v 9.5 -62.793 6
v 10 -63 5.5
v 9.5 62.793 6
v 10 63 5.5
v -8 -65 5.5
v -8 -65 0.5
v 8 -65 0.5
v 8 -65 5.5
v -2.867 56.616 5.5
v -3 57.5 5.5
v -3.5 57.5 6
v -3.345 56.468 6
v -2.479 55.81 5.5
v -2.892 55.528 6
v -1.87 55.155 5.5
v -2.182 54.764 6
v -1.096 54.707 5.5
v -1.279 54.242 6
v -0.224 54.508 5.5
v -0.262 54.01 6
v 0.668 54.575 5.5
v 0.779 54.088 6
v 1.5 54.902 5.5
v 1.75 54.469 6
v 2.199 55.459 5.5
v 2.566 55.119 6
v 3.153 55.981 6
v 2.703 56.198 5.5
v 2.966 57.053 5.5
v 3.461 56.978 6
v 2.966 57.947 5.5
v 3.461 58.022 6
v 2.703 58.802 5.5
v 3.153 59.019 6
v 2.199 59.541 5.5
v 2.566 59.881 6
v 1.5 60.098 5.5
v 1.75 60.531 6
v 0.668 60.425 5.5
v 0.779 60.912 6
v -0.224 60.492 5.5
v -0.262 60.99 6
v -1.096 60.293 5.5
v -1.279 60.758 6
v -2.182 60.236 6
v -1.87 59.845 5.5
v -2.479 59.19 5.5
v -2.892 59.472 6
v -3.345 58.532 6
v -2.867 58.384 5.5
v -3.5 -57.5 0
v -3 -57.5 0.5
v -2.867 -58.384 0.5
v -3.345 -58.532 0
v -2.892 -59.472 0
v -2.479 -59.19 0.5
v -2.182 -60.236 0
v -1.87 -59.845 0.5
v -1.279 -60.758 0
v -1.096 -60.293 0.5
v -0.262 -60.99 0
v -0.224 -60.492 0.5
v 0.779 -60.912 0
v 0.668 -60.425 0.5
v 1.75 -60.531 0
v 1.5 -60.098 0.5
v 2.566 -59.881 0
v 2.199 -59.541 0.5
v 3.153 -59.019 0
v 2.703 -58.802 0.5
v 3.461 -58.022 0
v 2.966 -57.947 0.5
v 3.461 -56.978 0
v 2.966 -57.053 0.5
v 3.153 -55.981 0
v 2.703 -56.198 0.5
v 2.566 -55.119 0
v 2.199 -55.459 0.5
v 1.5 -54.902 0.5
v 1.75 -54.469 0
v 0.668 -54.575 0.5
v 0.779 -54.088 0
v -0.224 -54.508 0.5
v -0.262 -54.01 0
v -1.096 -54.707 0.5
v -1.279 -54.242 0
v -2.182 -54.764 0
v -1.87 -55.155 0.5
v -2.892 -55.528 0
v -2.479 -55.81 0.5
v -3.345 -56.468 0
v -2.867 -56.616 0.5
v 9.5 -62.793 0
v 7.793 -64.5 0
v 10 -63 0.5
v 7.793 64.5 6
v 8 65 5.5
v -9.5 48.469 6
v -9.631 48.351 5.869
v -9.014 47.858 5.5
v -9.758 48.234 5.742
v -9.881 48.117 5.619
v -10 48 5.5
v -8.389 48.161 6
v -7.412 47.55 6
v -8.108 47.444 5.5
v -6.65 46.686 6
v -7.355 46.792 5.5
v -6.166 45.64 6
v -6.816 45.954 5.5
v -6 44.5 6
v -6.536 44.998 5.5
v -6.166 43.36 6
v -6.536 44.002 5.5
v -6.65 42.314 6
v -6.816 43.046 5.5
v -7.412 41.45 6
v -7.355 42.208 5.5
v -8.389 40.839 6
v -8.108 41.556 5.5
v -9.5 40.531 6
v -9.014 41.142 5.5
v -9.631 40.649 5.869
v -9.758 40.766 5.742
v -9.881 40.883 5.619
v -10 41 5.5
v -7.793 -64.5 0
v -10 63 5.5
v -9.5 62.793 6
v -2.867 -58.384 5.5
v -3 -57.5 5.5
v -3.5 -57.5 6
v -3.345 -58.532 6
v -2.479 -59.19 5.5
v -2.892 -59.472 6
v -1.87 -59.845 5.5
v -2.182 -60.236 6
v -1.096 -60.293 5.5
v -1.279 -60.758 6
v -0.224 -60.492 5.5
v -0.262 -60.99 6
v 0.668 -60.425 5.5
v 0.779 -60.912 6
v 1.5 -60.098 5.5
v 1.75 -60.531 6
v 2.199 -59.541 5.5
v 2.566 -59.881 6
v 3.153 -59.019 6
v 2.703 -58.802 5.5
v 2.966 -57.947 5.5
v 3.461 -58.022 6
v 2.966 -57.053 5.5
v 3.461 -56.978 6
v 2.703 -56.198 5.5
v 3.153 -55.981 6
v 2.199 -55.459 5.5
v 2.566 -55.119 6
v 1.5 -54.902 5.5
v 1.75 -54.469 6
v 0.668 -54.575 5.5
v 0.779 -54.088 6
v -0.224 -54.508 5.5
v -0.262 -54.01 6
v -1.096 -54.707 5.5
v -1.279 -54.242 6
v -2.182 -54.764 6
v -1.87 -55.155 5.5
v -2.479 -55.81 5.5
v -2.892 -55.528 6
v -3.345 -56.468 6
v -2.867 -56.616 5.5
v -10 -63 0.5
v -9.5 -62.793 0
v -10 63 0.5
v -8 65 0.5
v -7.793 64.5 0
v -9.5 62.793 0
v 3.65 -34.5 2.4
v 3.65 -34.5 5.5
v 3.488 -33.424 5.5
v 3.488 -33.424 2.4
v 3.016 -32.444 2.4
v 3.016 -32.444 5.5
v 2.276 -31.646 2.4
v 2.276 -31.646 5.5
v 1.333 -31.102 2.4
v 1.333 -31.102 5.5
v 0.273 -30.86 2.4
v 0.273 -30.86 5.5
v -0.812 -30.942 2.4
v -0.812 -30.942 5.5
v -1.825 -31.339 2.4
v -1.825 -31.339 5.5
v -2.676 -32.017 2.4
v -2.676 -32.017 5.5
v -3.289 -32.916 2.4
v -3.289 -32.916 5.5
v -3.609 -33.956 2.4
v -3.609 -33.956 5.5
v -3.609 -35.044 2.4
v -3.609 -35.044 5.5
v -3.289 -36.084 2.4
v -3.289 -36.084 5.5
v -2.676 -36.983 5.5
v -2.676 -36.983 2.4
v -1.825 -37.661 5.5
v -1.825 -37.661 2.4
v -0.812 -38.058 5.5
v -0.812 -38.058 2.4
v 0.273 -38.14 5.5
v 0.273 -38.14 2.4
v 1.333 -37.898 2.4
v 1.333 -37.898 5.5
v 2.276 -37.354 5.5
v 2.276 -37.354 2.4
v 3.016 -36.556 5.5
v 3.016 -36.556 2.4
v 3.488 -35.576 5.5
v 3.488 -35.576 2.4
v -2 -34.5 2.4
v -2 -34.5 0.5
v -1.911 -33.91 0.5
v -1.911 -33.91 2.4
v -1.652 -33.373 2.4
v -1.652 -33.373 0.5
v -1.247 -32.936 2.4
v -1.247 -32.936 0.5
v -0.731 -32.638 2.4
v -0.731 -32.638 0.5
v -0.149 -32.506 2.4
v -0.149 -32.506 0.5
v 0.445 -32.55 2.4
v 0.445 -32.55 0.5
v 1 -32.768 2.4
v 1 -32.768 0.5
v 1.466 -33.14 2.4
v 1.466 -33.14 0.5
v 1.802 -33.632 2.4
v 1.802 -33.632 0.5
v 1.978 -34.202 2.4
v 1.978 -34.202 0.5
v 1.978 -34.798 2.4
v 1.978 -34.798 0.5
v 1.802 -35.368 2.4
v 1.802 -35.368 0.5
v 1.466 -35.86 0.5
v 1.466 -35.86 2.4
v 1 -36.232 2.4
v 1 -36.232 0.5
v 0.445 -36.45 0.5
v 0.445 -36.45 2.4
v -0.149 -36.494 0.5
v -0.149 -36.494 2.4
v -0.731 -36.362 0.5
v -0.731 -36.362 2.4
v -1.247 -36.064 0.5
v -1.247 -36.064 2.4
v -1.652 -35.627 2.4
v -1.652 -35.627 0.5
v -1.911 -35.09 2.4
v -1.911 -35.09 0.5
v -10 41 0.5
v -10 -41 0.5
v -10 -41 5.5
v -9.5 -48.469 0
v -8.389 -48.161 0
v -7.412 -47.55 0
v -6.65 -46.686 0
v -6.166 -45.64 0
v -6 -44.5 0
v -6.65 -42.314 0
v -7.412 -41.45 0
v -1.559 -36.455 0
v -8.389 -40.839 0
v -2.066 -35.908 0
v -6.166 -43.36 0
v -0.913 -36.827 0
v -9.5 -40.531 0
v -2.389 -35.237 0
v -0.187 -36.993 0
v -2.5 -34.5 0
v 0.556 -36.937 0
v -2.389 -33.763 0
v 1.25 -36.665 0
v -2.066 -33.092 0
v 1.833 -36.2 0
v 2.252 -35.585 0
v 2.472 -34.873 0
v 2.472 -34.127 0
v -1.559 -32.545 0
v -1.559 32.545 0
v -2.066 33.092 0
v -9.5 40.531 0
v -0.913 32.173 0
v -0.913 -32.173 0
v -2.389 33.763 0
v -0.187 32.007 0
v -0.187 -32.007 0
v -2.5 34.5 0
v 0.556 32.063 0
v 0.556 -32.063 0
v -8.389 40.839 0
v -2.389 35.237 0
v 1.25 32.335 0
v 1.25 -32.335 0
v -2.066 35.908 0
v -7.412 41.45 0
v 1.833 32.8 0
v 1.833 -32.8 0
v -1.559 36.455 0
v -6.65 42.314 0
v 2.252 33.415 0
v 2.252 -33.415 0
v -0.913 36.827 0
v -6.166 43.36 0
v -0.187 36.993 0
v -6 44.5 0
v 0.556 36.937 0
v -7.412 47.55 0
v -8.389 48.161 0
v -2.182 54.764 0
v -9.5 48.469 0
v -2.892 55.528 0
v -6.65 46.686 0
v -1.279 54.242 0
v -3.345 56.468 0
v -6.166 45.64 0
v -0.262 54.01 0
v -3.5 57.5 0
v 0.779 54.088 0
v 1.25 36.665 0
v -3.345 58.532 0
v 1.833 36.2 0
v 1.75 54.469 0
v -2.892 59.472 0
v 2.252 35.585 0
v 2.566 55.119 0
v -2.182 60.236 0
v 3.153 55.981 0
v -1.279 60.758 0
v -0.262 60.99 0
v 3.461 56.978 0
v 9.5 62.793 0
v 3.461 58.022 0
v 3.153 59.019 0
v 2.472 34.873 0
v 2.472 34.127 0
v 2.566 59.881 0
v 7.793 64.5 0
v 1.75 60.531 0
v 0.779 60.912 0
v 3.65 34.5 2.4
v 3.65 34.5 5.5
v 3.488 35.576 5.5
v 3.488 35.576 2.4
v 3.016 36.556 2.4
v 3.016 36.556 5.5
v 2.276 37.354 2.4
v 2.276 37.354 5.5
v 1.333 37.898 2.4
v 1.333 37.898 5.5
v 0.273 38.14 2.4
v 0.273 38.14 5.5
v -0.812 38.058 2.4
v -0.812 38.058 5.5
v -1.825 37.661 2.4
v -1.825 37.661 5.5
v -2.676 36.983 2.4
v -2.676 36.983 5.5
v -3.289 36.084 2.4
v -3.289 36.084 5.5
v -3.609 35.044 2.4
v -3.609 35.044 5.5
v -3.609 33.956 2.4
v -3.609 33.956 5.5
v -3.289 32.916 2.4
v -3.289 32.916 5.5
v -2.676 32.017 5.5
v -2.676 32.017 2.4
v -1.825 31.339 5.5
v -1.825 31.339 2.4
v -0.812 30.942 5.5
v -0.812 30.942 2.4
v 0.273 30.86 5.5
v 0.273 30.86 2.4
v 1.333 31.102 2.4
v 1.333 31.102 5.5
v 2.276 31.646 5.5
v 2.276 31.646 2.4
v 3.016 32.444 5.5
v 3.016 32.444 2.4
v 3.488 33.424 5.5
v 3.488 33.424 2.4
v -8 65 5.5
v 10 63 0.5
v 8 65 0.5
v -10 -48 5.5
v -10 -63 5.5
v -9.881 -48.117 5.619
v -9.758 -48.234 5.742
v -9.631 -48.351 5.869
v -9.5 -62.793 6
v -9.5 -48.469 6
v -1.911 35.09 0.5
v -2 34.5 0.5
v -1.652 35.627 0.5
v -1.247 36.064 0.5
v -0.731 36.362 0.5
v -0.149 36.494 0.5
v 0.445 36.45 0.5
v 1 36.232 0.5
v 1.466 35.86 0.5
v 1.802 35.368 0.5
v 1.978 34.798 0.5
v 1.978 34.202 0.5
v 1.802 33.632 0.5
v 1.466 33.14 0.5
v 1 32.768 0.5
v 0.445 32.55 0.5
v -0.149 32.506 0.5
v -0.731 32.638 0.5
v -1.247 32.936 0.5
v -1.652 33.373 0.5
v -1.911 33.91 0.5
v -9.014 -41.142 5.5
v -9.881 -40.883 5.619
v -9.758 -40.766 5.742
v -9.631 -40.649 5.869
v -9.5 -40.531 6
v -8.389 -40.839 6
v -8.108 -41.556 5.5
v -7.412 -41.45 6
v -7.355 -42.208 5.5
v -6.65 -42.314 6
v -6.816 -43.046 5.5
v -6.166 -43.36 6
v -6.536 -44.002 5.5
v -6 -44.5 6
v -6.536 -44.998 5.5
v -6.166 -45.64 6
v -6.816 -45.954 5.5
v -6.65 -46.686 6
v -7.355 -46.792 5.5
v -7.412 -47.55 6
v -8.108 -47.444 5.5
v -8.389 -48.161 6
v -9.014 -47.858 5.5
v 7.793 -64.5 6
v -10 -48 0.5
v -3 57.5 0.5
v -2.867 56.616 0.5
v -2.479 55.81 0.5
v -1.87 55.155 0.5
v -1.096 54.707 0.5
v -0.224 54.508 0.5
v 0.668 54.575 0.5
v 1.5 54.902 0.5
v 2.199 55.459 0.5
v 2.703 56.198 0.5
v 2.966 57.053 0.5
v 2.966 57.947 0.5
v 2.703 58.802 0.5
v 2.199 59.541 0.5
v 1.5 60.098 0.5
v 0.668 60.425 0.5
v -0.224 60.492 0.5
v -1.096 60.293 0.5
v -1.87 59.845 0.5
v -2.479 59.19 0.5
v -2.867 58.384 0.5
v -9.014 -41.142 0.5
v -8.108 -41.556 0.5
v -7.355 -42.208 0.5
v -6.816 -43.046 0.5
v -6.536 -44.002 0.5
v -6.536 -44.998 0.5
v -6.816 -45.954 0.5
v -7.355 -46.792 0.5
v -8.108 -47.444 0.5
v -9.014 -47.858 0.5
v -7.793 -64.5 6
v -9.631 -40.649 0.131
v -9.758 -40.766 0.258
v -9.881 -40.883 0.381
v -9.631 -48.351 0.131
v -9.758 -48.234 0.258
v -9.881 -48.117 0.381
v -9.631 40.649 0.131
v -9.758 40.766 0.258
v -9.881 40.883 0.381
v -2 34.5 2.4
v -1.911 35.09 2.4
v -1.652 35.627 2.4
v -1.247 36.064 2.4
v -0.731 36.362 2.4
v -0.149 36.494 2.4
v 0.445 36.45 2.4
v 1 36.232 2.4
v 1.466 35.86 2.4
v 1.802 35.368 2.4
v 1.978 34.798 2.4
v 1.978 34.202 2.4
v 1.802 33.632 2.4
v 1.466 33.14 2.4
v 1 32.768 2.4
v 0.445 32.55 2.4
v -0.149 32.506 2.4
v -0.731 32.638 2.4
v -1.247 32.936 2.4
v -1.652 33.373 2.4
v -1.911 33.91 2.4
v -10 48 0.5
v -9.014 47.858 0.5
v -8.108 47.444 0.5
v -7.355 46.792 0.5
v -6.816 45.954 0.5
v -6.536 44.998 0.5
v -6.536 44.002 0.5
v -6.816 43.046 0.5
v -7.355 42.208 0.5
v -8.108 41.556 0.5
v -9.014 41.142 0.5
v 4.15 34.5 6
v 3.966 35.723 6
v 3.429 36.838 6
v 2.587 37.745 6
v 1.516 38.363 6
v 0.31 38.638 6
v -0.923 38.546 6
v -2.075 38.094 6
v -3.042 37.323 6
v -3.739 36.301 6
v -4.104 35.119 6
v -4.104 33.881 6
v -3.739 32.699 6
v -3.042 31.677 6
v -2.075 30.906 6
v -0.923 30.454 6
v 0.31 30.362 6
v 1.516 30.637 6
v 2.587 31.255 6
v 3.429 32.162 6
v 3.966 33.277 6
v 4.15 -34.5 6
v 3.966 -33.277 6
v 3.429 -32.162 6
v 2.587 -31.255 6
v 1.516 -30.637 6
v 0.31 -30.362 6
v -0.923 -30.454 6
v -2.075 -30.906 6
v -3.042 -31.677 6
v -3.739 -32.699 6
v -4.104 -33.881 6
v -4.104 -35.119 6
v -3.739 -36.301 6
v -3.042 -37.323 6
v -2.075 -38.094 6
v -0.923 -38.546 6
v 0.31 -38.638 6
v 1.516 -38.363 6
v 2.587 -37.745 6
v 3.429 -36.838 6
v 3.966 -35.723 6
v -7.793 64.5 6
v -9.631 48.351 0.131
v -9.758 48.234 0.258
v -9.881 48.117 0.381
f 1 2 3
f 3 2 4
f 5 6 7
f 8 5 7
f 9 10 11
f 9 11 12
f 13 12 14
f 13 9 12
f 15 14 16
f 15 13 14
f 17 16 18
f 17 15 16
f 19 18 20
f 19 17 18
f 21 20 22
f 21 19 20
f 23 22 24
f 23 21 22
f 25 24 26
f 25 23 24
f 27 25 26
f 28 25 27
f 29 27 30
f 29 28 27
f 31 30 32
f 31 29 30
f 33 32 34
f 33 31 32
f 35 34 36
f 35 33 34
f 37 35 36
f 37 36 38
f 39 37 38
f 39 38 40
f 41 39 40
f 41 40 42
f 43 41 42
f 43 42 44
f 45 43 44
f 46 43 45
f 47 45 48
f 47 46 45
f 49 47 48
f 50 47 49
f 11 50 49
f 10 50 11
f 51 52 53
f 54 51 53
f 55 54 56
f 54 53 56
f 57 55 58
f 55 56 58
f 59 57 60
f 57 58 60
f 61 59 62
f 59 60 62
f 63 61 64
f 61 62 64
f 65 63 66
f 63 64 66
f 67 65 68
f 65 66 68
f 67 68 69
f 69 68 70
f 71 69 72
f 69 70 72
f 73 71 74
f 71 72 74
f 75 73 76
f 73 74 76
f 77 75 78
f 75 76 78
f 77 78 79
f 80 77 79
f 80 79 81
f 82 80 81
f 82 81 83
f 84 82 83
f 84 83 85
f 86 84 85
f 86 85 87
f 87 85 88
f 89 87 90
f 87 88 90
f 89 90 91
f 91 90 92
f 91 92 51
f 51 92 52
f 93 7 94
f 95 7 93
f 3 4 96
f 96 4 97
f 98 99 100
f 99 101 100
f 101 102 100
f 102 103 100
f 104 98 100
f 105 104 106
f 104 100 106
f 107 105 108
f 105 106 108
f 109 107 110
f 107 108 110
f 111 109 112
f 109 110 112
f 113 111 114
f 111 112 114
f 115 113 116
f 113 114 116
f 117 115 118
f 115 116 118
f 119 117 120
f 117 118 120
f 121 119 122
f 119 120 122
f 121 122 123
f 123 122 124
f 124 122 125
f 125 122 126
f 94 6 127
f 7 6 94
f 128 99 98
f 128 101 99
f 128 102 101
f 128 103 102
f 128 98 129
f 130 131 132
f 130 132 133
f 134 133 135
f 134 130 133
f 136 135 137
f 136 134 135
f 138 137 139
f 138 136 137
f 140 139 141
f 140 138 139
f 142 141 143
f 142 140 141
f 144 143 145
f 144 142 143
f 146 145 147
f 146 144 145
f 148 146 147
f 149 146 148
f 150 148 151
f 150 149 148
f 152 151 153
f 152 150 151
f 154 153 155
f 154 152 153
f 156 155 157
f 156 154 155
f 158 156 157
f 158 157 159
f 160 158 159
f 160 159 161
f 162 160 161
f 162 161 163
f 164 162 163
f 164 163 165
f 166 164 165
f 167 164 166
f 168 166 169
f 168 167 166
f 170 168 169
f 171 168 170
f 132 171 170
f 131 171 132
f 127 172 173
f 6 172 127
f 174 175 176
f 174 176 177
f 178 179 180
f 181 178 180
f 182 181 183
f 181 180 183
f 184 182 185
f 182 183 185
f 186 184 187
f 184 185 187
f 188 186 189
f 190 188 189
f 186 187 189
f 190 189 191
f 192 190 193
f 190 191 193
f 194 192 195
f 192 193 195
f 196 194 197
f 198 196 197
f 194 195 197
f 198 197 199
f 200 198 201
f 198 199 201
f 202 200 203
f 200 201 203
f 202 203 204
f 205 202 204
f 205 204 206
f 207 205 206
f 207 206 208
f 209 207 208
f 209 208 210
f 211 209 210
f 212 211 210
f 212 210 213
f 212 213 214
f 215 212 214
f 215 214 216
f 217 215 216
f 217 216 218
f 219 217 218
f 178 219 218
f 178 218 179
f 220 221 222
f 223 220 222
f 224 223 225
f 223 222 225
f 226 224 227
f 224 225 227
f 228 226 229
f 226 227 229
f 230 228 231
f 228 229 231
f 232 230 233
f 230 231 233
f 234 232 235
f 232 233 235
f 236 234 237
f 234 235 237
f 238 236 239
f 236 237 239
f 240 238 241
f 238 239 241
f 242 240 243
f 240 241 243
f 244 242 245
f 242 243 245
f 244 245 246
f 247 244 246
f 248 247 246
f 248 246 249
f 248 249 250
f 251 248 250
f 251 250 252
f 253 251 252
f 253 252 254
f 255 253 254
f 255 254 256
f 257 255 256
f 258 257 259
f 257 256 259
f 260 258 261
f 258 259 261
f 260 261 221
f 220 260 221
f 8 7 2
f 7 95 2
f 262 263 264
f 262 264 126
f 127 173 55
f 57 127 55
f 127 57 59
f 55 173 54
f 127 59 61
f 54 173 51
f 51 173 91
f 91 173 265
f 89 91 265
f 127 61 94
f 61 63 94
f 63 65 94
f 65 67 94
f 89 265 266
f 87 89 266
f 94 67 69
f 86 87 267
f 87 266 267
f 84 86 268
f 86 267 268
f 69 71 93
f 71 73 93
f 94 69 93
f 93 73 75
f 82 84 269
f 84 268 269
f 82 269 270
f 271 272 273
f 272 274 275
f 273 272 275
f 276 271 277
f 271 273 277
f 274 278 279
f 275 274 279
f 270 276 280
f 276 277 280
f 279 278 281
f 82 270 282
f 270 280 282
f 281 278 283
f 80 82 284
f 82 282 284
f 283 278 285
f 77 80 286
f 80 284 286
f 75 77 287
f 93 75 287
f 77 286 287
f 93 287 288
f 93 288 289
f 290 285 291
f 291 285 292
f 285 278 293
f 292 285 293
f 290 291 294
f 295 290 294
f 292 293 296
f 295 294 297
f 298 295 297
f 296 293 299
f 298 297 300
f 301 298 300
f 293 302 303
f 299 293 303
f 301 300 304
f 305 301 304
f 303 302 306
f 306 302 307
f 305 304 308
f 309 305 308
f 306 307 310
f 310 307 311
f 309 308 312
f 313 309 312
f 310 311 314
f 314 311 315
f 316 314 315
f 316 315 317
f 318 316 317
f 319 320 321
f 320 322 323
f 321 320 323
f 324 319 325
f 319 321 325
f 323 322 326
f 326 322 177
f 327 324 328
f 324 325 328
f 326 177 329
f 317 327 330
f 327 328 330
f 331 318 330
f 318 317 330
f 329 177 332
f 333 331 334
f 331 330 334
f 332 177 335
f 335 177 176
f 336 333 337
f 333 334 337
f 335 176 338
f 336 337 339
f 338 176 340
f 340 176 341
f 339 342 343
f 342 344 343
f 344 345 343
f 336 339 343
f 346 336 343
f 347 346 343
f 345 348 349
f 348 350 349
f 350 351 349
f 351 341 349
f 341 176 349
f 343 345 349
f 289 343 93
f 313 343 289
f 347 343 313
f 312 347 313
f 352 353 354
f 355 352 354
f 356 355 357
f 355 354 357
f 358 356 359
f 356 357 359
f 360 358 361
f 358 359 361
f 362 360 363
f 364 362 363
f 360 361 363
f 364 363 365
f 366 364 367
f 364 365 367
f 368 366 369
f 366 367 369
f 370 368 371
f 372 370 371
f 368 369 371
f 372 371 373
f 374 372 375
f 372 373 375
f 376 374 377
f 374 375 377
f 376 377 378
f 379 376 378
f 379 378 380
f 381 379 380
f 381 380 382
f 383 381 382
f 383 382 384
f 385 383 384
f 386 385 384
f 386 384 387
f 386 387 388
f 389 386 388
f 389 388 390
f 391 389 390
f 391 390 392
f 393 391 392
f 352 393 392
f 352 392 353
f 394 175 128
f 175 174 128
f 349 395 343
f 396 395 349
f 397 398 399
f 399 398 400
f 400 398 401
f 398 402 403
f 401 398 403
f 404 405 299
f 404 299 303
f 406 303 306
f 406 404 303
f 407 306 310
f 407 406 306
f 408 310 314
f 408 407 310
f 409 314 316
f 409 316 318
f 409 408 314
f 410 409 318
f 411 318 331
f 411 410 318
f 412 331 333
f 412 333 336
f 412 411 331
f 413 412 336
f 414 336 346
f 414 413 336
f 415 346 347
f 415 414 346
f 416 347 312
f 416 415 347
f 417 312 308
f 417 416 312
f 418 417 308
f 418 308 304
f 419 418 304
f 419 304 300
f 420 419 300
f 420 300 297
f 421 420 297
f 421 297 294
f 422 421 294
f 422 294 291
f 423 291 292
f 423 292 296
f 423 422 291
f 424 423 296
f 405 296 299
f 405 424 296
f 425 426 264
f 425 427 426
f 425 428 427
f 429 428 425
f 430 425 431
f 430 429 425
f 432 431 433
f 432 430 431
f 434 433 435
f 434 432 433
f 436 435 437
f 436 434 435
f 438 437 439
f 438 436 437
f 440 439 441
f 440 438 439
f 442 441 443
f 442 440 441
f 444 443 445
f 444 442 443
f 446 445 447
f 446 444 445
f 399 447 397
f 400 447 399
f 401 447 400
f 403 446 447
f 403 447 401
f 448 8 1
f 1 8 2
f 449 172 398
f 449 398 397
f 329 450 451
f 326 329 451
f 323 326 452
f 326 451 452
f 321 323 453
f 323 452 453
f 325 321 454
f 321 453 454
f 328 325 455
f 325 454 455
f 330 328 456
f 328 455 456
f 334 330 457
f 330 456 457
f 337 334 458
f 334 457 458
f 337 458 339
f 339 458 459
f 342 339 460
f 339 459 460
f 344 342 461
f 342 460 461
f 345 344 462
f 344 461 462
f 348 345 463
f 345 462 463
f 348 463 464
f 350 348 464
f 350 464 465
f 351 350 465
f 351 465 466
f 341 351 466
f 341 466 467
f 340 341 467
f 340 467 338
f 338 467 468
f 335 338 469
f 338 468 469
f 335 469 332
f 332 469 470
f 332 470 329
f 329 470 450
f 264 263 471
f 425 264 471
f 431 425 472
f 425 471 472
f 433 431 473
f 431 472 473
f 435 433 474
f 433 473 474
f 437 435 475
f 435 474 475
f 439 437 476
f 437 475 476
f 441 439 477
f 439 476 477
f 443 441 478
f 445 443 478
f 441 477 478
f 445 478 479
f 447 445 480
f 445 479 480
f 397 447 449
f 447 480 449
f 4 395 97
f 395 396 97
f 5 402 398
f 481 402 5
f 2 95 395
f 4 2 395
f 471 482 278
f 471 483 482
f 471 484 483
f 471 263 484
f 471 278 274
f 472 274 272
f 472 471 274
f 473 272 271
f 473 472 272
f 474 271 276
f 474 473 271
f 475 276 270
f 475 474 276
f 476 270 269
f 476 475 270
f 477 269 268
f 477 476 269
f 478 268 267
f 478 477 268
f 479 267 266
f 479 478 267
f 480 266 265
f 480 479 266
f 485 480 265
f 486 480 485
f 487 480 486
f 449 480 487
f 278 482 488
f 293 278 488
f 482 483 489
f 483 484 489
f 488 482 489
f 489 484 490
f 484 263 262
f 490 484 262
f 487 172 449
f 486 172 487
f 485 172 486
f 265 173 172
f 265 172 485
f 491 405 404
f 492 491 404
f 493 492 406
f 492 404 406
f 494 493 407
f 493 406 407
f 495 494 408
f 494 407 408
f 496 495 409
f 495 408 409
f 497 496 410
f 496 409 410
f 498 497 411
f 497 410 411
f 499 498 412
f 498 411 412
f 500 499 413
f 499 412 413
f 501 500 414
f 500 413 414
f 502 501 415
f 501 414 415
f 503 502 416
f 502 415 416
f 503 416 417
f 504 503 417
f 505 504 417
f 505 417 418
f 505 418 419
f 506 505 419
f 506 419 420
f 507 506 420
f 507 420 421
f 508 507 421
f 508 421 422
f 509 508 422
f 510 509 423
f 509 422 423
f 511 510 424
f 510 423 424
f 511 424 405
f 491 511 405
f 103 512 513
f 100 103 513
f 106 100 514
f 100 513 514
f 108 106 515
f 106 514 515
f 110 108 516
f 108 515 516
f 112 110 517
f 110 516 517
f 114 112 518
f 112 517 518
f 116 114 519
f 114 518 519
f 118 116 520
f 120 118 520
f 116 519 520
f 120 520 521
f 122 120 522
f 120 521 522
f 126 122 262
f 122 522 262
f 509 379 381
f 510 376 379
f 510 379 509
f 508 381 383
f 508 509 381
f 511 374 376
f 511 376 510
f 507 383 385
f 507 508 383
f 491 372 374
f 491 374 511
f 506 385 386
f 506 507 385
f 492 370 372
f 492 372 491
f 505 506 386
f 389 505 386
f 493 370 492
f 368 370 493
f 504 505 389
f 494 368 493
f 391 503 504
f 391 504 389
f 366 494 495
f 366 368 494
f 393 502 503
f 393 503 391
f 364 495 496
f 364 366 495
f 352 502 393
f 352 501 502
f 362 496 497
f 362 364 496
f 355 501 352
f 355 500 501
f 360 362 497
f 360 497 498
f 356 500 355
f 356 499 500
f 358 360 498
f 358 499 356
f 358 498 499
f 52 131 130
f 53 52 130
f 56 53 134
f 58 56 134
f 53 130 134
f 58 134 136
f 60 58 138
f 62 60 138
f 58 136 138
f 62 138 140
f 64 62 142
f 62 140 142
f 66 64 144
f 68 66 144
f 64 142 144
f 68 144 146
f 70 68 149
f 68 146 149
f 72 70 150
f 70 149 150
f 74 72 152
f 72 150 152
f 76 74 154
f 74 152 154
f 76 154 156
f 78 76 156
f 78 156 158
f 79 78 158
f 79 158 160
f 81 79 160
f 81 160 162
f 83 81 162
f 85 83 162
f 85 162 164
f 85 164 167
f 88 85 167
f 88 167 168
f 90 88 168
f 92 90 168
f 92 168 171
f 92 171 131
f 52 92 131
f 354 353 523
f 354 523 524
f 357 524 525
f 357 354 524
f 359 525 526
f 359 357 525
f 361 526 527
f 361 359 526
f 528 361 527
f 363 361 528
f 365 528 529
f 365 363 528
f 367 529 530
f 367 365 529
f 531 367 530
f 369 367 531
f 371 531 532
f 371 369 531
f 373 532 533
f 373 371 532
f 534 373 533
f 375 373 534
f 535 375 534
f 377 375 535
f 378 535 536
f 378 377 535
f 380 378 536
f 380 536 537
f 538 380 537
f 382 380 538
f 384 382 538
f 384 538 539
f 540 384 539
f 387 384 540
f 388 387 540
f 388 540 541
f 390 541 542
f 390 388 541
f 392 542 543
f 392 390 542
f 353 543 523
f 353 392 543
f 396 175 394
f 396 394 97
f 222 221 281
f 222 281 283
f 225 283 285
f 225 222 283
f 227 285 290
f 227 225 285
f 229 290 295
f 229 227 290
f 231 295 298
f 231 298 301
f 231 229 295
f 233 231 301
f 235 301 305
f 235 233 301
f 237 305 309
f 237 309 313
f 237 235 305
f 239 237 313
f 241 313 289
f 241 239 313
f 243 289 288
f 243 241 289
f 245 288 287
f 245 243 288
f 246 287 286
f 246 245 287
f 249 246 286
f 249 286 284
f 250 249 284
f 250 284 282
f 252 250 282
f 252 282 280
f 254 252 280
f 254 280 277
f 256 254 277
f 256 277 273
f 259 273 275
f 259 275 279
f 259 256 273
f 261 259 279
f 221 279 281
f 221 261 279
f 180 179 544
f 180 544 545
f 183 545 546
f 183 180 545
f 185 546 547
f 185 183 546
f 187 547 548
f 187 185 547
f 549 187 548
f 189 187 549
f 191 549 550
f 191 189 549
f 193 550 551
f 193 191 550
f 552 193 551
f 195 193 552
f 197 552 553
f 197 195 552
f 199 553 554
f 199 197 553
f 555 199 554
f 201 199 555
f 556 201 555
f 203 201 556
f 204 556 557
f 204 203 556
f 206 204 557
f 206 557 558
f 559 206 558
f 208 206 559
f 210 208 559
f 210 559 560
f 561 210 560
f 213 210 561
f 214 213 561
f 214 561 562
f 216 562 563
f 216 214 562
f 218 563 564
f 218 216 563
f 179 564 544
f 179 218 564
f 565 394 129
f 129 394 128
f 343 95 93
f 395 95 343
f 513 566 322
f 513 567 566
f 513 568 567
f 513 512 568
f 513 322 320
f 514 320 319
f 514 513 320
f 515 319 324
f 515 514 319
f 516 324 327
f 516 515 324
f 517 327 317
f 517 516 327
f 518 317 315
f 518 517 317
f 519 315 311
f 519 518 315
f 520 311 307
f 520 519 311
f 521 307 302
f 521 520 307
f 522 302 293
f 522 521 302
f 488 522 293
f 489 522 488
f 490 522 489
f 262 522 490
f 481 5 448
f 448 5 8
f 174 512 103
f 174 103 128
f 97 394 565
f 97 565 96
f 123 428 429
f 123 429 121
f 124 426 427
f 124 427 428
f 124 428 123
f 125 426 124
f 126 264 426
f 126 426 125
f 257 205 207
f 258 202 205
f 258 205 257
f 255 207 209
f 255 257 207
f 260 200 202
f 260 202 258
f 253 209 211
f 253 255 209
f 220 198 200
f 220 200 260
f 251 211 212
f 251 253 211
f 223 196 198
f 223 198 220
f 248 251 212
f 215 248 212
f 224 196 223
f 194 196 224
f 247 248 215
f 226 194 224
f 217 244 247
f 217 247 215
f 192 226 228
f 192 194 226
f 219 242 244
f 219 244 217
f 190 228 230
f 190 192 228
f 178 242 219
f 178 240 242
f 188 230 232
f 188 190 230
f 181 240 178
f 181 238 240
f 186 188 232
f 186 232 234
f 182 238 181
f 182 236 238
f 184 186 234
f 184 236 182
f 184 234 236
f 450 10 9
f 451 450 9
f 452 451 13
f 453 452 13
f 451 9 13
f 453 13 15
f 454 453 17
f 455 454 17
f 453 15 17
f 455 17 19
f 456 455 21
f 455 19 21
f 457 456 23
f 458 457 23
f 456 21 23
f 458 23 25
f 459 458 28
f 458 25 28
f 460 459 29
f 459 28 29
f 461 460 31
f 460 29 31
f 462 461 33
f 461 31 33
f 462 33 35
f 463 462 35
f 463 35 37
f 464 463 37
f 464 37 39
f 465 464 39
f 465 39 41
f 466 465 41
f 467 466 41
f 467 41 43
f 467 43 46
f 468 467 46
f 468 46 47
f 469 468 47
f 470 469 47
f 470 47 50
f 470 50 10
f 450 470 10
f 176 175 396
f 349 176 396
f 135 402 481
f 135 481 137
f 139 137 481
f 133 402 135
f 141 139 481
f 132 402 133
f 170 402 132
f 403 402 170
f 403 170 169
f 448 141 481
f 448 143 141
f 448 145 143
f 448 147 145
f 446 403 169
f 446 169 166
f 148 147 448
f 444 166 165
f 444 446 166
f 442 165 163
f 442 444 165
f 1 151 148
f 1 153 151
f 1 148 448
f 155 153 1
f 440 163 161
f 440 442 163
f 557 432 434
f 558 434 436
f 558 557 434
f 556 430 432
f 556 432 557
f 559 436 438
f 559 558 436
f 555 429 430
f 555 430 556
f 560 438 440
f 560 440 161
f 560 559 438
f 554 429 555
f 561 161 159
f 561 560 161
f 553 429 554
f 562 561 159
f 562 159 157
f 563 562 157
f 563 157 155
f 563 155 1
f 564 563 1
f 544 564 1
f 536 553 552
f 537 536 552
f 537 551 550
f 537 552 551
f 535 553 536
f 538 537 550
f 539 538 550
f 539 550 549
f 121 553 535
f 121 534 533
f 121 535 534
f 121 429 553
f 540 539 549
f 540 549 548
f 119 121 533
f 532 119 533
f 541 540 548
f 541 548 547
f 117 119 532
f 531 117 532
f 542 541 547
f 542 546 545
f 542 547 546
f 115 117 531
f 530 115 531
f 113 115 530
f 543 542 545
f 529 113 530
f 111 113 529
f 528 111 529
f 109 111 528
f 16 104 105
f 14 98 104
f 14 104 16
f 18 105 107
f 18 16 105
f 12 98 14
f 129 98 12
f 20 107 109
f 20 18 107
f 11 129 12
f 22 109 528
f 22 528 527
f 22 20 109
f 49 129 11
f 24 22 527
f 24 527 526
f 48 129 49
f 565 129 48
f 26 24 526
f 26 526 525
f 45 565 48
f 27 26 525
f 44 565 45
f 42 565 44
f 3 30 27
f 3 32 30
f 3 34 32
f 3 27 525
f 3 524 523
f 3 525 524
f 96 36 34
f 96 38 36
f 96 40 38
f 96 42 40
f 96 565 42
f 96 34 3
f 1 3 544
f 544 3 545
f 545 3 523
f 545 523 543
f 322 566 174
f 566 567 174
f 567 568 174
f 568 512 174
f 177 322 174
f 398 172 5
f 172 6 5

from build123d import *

# Parameters (mm, degrees)
F0_W           = 20
F0_H           = 130
F1_DEPTH       = 6
F3_D           = 4
F3_DEPTH       = 20
F3_CBORE_D     = 7.3
F3_CBORE_DEPTH = 3.6
F5_D           = 7
F5_DEPTH       = 20
F7_D           = 6
F7_DEPTH       = 20
F8_SIZE        = 2
F9_SIZE        = 0.5


with BuildPart() as f1:
    # F0 (on Top) → F1 (new body)
    with BuildSketch(Plane.XY):
        Rectangle(F0_W, F0_H)
    extrude(amount=F1_DEPTH)

    # F3
    with Locations(Plane.XY.offset(6)):
        with Locations((0, 34.5), (0, -34.5)):
            CounterBoreHole(F3_D / 2, F3_CBORE_D / 2, F3_CBORE_DEPTH, depth=F3_DEPTH)

    # F5
    with Locations(Plane.XY.offset(6)):
        with Locations((-10, 44.5), (-10, -44.5)):
            Hole(F5_D / 2, depth=F5_DEPTH)

    # F7
    with Locations(Plane(origin=(0, 0, 0), x_dir=(1, 0, 0), z_dir=(0, 0, -1))):
        with Locations((0, -57.5), (0, 57.5)):
            Hole(F7_D / 2, depth=F7_DEPTH)

    # F8
    f8_edges = [f1.edges().sort_by_distance(p)[0] for p in [
        (-10, -65, 3),
        (10, -65, 3),
        (-10, 65, 3),
        (10, 65, 3),
    ]]
    chamfer(f8_edges, length=F8_SIZE)

    # F9
    f9_edges = [f1.edges().sort_by_distance(p)[0] for p in [
        (-10, -55.5, 0),
        (-9, -64, 0),
        (-6.5, -44.5, 0),
        (0, -65, 0),
        (-10, 0, 0),
        (9, -64, 0),
        (-6.5, 44.5, 0),
        (10, 0, 0),
        (-10, 55.5, 0),
        (9, 64, 0),
        (-9, 64, 0),
        (0, 65, 0),
        (-3, -57.5, 0),
        (-2, -34.5, 0),
        (-2, 34.5, 0),
        (-3, 57.5, 0),
        (-10, -55.5, 6),
        (-9, -64, 6),
        (-6.5, -44.5, 6),
        (0, -65, 6),
        (-10, 0, 6),
        (9, -64, 6),
        (-6.5, 44.5, 6),
        (10, 0, 6),
        (-10, 55.5, 6),
        (9, 64, 6),
        (-9, 64, 6),
        (0, 65, 6),
        (-3, -57.5, 6),
        (-3.65, -34.5, 6),
        (-3.65, 34.5, 6),
        (-3, 57.5, 6),
    ]]
    chamfer(f9_edges, length=F9_SIZE)


solid = f1.part
